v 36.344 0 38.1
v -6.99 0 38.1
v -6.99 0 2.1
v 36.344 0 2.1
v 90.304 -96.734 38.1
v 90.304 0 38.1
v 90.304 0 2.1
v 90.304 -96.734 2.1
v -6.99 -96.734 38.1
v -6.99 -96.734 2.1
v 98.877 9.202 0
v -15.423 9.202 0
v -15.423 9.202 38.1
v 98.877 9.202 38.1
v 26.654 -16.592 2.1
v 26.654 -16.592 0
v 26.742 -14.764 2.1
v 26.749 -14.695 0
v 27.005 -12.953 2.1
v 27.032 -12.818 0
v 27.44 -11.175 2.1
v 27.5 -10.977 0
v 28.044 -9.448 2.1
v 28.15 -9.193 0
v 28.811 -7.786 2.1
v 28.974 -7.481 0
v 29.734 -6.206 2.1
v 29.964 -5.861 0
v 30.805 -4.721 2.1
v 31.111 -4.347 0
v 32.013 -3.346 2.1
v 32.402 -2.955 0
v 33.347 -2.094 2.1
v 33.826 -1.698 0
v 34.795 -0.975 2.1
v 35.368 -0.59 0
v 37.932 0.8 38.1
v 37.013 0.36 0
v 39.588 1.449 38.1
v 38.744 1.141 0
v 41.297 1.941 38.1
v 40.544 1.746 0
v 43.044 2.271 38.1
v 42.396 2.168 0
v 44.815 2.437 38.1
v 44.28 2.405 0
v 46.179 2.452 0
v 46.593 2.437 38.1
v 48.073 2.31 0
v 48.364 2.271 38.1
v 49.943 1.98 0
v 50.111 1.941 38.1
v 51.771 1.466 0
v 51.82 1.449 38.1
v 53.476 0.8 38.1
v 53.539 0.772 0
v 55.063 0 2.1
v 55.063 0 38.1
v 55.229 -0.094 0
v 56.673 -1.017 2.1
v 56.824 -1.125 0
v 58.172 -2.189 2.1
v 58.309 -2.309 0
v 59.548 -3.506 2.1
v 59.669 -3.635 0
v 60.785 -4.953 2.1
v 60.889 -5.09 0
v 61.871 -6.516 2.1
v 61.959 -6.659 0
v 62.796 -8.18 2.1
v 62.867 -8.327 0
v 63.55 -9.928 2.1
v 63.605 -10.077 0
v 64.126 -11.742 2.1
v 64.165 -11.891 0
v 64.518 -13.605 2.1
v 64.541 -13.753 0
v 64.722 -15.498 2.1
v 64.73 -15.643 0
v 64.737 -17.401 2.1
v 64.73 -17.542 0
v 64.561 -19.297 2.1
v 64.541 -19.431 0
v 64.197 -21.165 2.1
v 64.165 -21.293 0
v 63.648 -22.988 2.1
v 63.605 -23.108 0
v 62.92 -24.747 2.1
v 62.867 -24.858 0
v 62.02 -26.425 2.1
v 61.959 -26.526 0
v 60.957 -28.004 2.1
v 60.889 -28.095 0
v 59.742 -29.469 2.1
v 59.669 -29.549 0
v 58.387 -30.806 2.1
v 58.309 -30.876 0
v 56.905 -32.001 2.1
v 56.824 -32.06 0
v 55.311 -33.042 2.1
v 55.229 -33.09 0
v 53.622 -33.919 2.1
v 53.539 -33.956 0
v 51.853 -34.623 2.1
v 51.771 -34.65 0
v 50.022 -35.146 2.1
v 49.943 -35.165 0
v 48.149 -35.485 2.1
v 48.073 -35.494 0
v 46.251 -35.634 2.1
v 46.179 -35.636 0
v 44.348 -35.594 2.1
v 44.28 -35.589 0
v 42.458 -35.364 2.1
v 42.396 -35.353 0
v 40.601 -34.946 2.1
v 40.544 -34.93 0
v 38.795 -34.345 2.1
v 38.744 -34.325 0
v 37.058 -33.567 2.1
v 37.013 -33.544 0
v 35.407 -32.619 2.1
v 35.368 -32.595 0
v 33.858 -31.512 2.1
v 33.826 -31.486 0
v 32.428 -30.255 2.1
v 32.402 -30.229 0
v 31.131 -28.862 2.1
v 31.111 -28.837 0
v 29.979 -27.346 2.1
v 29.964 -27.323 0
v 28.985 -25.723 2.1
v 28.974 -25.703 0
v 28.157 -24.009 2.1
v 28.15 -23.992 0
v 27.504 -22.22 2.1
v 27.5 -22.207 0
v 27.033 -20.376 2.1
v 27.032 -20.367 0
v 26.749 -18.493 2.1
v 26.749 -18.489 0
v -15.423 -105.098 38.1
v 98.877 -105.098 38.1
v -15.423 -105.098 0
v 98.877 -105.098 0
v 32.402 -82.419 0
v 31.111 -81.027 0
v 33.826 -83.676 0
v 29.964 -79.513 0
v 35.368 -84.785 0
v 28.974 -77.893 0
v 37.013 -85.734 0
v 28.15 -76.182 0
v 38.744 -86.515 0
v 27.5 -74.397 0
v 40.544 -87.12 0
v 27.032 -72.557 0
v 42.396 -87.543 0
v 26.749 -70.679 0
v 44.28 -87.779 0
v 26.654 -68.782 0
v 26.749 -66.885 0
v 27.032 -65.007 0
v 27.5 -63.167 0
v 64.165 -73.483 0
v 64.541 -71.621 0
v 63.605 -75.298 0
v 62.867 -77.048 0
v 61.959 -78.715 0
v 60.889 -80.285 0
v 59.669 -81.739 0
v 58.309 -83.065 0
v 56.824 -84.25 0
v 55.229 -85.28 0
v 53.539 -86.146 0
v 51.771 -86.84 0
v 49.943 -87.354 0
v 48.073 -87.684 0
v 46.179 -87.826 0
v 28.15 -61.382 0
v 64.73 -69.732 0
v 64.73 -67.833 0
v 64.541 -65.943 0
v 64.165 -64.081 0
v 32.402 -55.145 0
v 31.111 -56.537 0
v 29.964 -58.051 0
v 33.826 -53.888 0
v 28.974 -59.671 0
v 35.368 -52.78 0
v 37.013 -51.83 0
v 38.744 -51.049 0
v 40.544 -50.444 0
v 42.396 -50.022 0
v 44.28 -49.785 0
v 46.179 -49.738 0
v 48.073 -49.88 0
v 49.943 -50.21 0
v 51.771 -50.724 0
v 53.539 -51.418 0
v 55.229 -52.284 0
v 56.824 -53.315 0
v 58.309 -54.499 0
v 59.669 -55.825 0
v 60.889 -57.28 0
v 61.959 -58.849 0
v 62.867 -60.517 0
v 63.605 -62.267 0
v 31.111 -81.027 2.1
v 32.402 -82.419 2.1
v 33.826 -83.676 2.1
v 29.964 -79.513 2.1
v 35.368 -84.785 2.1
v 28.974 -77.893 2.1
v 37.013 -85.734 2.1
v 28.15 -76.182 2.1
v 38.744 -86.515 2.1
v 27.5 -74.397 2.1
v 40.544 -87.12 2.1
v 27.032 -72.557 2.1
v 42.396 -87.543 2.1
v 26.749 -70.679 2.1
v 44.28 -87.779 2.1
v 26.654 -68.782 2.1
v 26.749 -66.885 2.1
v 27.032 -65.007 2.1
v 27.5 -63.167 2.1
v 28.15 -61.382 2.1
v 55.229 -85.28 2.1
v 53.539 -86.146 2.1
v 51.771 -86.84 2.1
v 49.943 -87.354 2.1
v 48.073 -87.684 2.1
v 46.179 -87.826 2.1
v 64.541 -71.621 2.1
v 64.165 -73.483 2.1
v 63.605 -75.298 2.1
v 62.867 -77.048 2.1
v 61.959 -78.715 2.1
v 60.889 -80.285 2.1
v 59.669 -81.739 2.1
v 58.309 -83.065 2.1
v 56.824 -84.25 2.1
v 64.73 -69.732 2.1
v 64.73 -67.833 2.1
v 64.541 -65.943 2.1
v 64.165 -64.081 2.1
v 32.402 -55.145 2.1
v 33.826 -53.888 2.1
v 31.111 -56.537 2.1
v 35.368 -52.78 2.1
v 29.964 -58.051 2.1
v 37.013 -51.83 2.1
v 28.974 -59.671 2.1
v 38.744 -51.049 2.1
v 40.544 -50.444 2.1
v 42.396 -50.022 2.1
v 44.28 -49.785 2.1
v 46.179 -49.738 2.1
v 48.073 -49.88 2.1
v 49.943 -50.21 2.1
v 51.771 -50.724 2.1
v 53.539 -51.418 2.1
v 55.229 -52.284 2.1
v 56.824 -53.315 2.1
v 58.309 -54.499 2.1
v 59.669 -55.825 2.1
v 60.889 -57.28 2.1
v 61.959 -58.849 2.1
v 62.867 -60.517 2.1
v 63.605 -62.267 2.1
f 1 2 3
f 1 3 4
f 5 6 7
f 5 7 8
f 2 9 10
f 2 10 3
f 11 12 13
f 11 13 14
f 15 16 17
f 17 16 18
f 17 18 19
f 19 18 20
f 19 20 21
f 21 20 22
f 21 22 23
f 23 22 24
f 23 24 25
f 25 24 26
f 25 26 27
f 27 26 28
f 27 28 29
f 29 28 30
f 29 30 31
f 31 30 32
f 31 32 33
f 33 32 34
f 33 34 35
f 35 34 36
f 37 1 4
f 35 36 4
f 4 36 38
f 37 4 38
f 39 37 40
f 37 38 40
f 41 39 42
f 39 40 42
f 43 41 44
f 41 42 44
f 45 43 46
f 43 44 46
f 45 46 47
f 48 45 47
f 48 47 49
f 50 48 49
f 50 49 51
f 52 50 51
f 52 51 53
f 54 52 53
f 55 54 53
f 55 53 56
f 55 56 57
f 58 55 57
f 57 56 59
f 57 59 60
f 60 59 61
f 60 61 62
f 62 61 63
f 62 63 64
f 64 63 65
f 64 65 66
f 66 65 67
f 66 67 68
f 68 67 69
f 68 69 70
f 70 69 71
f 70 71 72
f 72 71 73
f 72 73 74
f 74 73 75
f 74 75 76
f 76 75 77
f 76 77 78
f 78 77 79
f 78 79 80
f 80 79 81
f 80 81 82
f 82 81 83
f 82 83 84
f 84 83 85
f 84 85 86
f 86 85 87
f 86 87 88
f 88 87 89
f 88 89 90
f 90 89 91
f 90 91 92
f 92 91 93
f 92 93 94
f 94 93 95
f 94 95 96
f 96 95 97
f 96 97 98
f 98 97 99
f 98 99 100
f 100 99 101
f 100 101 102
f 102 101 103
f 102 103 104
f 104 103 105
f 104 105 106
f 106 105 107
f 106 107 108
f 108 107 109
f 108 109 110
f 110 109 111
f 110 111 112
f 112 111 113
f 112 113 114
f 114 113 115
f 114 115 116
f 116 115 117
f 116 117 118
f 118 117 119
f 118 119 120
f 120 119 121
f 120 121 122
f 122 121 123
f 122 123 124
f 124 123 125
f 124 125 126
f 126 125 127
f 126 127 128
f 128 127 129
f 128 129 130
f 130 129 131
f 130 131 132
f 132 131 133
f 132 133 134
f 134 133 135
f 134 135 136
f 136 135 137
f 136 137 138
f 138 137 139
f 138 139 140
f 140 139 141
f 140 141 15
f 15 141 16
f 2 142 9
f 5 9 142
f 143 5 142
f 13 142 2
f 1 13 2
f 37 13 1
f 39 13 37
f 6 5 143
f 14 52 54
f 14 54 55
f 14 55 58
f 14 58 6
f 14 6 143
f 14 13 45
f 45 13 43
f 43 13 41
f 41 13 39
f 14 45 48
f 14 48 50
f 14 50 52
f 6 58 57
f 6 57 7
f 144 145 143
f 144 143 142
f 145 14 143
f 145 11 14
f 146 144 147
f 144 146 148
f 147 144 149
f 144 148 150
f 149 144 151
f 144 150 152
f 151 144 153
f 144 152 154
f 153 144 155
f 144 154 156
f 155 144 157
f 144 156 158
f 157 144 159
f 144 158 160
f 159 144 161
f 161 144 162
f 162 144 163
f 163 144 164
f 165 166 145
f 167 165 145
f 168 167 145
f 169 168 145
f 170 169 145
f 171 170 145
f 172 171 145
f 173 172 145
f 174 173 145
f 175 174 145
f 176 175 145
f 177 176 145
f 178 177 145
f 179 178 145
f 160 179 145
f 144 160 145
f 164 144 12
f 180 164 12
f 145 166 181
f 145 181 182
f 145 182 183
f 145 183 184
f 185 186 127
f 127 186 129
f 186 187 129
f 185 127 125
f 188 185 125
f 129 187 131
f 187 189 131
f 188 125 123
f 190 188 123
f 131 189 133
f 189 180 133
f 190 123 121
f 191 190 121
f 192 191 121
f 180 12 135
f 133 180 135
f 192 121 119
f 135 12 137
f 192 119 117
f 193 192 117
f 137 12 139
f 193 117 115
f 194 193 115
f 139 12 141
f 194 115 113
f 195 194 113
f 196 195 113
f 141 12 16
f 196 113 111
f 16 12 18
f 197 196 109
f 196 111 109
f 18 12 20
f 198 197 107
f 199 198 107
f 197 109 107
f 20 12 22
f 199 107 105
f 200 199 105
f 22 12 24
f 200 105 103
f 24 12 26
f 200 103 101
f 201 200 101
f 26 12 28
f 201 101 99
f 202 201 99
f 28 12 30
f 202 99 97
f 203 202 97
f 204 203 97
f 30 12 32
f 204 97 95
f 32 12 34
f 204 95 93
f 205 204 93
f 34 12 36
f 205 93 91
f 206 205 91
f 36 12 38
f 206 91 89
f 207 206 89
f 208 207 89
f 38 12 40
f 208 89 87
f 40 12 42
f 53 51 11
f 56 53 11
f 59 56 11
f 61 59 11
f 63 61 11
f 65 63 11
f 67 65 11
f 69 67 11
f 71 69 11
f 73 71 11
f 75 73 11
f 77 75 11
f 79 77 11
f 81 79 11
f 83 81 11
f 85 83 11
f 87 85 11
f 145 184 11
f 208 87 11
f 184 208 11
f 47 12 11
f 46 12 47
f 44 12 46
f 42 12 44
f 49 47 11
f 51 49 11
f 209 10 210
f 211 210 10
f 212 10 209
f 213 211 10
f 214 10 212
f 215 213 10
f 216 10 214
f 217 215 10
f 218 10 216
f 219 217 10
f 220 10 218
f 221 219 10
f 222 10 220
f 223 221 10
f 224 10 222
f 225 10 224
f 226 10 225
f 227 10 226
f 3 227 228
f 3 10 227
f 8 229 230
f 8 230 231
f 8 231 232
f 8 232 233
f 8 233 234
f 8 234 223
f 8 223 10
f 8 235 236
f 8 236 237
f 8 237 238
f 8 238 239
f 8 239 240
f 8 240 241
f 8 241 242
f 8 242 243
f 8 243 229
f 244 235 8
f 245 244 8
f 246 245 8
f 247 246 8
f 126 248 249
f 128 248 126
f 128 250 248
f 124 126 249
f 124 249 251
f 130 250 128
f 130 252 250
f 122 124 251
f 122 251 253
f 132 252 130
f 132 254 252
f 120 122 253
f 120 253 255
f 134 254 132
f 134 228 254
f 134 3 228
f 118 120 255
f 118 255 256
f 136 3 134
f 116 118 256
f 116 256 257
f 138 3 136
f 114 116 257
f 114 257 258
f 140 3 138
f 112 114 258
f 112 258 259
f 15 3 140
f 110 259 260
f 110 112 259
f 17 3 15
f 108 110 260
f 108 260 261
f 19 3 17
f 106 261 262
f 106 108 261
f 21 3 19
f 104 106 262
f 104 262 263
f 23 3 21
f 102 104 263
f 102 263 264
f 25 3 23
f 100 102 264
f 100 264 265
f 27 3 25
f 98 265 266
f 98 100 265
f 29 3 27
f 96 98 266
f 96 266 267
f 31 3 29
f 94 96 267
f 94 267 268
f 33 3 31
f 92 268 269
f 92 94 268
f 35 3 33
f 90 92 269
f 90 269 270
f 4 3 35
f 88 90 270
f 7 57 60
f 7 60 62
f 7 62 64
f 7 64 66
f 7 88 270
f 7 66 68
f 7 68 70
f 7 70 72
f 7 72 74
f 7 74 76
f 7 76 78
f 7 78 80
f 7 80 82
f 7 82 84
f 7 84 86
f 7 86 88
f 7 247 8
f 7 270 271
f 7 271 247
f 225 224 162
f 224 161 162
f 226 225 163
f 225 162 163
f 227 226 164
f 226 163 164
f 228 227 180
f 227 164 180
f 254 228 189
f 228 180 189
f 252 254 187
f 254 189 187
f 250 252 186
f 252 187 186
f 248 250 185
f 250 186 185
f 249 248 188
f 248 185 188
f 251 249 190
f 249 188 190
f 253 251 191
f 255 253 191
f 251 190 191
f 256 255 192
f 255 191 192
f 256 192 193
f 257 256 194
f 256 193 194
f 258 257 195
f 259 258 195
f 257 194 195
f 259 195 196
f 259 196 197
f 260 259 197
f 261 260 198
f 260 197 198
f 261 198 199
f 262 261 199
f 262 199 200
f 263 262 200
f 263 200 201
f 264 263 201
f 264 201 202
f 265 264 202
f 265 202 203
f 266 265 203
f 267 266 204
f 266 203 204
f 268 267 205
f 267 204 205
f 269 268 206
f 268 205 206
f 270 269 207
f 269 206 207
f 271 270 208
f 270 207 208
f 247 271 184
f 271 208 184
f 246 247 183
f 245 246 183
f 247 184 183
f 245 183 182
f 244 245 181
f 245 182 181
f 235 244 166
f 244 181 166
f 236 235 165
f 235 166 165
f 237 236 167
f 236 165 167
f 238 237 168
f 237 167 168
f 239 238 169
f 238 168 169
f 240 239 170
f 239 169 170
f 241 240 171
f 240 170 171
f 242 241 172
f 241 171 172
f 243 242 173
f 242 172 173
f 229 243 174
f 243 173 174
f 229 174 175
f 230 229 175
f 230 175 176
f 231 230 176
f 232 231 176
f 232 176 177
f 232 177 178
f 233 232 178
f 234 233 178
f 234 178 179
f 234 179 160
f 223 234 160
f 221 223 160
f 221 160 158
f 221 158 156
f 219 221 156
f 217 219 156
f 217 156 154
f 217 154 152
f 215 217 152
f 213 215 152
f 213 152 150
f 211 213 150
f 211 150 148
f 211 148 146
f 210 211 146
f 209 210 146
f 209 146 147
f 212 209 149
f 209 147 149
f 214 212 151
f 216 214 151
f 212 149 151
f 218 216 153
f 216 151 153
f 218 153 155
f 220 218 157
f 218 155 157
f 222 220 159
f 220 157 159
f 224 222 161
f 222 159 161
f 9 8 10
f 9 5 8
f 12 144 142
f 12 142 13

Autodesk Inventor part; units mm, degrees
ref_plane "YZ Plane" through (0, 0, 0) normal (1, 0, 0) x (0, 1, 0)
ref_plane "XZ Plane" through (0, 0, 0) normal (0, 1, 0) x (-1, 0, 0)
ref_plane "XY Plane" through (0, 0, 0) normal (0, 0, 1) x (1, 0, 0)
sketch "Sketch1" plane through (0, 0, 0) normal (0, 0, 1) x (1, 0, 0)
  line L0 (-15.4228, 9.2021) -> (98.8772, 9.2021)
  line L1 (98.8772, 9.2021) -> (98.8772, -105.0979)
  line L2 (98.8772, -105.0979) -> (-15.4228, -105.0979)
  line L3 (-15.4228, -105.0979) -> (-15.4228, 9.2021)
  point P0 (0, 0)
  dimension "d0" = 114.3
  dimension "d1" = 114.3
extrude "Extrusion1" add sketch "Sketch1" along normal blind 38.1
sketch "Sketch2" plane through (0, 0, 38.1) normal (0, 0, 1) x (1, 0, 0)
  line L0 (-6.9895, 0) -> (90.3039, 0)
  line L1 (90.3039, 0) -> (90.3039, -96.7342)
  line L2 (90.3039, -96.7342) -> (-6.9895, -96.7342)
  line L3 (-6.9895, -96.7342) -> (-6.9895, 0)
  point P0 (0, 0)
extrude "Extrusion2" cut sketch "Sketch2" against normal blind 36
sketch "Sketch3" plane through (0, 0, 0) normal (0, 0, -1) x (-1, 0, 0)
  circle A0 centre (-45.7039, -16.5922) radius 19.05
  circle A1 centre (-45.7039, -68.7821) radius 19.05
  point P0 (0, 0)
  dimension "d6" = 38.1
  dimension "d7" = 38.1
extrude "Extrusion3" cut sketch "Sketch3" against normal through all
properties part number "ledbox"
